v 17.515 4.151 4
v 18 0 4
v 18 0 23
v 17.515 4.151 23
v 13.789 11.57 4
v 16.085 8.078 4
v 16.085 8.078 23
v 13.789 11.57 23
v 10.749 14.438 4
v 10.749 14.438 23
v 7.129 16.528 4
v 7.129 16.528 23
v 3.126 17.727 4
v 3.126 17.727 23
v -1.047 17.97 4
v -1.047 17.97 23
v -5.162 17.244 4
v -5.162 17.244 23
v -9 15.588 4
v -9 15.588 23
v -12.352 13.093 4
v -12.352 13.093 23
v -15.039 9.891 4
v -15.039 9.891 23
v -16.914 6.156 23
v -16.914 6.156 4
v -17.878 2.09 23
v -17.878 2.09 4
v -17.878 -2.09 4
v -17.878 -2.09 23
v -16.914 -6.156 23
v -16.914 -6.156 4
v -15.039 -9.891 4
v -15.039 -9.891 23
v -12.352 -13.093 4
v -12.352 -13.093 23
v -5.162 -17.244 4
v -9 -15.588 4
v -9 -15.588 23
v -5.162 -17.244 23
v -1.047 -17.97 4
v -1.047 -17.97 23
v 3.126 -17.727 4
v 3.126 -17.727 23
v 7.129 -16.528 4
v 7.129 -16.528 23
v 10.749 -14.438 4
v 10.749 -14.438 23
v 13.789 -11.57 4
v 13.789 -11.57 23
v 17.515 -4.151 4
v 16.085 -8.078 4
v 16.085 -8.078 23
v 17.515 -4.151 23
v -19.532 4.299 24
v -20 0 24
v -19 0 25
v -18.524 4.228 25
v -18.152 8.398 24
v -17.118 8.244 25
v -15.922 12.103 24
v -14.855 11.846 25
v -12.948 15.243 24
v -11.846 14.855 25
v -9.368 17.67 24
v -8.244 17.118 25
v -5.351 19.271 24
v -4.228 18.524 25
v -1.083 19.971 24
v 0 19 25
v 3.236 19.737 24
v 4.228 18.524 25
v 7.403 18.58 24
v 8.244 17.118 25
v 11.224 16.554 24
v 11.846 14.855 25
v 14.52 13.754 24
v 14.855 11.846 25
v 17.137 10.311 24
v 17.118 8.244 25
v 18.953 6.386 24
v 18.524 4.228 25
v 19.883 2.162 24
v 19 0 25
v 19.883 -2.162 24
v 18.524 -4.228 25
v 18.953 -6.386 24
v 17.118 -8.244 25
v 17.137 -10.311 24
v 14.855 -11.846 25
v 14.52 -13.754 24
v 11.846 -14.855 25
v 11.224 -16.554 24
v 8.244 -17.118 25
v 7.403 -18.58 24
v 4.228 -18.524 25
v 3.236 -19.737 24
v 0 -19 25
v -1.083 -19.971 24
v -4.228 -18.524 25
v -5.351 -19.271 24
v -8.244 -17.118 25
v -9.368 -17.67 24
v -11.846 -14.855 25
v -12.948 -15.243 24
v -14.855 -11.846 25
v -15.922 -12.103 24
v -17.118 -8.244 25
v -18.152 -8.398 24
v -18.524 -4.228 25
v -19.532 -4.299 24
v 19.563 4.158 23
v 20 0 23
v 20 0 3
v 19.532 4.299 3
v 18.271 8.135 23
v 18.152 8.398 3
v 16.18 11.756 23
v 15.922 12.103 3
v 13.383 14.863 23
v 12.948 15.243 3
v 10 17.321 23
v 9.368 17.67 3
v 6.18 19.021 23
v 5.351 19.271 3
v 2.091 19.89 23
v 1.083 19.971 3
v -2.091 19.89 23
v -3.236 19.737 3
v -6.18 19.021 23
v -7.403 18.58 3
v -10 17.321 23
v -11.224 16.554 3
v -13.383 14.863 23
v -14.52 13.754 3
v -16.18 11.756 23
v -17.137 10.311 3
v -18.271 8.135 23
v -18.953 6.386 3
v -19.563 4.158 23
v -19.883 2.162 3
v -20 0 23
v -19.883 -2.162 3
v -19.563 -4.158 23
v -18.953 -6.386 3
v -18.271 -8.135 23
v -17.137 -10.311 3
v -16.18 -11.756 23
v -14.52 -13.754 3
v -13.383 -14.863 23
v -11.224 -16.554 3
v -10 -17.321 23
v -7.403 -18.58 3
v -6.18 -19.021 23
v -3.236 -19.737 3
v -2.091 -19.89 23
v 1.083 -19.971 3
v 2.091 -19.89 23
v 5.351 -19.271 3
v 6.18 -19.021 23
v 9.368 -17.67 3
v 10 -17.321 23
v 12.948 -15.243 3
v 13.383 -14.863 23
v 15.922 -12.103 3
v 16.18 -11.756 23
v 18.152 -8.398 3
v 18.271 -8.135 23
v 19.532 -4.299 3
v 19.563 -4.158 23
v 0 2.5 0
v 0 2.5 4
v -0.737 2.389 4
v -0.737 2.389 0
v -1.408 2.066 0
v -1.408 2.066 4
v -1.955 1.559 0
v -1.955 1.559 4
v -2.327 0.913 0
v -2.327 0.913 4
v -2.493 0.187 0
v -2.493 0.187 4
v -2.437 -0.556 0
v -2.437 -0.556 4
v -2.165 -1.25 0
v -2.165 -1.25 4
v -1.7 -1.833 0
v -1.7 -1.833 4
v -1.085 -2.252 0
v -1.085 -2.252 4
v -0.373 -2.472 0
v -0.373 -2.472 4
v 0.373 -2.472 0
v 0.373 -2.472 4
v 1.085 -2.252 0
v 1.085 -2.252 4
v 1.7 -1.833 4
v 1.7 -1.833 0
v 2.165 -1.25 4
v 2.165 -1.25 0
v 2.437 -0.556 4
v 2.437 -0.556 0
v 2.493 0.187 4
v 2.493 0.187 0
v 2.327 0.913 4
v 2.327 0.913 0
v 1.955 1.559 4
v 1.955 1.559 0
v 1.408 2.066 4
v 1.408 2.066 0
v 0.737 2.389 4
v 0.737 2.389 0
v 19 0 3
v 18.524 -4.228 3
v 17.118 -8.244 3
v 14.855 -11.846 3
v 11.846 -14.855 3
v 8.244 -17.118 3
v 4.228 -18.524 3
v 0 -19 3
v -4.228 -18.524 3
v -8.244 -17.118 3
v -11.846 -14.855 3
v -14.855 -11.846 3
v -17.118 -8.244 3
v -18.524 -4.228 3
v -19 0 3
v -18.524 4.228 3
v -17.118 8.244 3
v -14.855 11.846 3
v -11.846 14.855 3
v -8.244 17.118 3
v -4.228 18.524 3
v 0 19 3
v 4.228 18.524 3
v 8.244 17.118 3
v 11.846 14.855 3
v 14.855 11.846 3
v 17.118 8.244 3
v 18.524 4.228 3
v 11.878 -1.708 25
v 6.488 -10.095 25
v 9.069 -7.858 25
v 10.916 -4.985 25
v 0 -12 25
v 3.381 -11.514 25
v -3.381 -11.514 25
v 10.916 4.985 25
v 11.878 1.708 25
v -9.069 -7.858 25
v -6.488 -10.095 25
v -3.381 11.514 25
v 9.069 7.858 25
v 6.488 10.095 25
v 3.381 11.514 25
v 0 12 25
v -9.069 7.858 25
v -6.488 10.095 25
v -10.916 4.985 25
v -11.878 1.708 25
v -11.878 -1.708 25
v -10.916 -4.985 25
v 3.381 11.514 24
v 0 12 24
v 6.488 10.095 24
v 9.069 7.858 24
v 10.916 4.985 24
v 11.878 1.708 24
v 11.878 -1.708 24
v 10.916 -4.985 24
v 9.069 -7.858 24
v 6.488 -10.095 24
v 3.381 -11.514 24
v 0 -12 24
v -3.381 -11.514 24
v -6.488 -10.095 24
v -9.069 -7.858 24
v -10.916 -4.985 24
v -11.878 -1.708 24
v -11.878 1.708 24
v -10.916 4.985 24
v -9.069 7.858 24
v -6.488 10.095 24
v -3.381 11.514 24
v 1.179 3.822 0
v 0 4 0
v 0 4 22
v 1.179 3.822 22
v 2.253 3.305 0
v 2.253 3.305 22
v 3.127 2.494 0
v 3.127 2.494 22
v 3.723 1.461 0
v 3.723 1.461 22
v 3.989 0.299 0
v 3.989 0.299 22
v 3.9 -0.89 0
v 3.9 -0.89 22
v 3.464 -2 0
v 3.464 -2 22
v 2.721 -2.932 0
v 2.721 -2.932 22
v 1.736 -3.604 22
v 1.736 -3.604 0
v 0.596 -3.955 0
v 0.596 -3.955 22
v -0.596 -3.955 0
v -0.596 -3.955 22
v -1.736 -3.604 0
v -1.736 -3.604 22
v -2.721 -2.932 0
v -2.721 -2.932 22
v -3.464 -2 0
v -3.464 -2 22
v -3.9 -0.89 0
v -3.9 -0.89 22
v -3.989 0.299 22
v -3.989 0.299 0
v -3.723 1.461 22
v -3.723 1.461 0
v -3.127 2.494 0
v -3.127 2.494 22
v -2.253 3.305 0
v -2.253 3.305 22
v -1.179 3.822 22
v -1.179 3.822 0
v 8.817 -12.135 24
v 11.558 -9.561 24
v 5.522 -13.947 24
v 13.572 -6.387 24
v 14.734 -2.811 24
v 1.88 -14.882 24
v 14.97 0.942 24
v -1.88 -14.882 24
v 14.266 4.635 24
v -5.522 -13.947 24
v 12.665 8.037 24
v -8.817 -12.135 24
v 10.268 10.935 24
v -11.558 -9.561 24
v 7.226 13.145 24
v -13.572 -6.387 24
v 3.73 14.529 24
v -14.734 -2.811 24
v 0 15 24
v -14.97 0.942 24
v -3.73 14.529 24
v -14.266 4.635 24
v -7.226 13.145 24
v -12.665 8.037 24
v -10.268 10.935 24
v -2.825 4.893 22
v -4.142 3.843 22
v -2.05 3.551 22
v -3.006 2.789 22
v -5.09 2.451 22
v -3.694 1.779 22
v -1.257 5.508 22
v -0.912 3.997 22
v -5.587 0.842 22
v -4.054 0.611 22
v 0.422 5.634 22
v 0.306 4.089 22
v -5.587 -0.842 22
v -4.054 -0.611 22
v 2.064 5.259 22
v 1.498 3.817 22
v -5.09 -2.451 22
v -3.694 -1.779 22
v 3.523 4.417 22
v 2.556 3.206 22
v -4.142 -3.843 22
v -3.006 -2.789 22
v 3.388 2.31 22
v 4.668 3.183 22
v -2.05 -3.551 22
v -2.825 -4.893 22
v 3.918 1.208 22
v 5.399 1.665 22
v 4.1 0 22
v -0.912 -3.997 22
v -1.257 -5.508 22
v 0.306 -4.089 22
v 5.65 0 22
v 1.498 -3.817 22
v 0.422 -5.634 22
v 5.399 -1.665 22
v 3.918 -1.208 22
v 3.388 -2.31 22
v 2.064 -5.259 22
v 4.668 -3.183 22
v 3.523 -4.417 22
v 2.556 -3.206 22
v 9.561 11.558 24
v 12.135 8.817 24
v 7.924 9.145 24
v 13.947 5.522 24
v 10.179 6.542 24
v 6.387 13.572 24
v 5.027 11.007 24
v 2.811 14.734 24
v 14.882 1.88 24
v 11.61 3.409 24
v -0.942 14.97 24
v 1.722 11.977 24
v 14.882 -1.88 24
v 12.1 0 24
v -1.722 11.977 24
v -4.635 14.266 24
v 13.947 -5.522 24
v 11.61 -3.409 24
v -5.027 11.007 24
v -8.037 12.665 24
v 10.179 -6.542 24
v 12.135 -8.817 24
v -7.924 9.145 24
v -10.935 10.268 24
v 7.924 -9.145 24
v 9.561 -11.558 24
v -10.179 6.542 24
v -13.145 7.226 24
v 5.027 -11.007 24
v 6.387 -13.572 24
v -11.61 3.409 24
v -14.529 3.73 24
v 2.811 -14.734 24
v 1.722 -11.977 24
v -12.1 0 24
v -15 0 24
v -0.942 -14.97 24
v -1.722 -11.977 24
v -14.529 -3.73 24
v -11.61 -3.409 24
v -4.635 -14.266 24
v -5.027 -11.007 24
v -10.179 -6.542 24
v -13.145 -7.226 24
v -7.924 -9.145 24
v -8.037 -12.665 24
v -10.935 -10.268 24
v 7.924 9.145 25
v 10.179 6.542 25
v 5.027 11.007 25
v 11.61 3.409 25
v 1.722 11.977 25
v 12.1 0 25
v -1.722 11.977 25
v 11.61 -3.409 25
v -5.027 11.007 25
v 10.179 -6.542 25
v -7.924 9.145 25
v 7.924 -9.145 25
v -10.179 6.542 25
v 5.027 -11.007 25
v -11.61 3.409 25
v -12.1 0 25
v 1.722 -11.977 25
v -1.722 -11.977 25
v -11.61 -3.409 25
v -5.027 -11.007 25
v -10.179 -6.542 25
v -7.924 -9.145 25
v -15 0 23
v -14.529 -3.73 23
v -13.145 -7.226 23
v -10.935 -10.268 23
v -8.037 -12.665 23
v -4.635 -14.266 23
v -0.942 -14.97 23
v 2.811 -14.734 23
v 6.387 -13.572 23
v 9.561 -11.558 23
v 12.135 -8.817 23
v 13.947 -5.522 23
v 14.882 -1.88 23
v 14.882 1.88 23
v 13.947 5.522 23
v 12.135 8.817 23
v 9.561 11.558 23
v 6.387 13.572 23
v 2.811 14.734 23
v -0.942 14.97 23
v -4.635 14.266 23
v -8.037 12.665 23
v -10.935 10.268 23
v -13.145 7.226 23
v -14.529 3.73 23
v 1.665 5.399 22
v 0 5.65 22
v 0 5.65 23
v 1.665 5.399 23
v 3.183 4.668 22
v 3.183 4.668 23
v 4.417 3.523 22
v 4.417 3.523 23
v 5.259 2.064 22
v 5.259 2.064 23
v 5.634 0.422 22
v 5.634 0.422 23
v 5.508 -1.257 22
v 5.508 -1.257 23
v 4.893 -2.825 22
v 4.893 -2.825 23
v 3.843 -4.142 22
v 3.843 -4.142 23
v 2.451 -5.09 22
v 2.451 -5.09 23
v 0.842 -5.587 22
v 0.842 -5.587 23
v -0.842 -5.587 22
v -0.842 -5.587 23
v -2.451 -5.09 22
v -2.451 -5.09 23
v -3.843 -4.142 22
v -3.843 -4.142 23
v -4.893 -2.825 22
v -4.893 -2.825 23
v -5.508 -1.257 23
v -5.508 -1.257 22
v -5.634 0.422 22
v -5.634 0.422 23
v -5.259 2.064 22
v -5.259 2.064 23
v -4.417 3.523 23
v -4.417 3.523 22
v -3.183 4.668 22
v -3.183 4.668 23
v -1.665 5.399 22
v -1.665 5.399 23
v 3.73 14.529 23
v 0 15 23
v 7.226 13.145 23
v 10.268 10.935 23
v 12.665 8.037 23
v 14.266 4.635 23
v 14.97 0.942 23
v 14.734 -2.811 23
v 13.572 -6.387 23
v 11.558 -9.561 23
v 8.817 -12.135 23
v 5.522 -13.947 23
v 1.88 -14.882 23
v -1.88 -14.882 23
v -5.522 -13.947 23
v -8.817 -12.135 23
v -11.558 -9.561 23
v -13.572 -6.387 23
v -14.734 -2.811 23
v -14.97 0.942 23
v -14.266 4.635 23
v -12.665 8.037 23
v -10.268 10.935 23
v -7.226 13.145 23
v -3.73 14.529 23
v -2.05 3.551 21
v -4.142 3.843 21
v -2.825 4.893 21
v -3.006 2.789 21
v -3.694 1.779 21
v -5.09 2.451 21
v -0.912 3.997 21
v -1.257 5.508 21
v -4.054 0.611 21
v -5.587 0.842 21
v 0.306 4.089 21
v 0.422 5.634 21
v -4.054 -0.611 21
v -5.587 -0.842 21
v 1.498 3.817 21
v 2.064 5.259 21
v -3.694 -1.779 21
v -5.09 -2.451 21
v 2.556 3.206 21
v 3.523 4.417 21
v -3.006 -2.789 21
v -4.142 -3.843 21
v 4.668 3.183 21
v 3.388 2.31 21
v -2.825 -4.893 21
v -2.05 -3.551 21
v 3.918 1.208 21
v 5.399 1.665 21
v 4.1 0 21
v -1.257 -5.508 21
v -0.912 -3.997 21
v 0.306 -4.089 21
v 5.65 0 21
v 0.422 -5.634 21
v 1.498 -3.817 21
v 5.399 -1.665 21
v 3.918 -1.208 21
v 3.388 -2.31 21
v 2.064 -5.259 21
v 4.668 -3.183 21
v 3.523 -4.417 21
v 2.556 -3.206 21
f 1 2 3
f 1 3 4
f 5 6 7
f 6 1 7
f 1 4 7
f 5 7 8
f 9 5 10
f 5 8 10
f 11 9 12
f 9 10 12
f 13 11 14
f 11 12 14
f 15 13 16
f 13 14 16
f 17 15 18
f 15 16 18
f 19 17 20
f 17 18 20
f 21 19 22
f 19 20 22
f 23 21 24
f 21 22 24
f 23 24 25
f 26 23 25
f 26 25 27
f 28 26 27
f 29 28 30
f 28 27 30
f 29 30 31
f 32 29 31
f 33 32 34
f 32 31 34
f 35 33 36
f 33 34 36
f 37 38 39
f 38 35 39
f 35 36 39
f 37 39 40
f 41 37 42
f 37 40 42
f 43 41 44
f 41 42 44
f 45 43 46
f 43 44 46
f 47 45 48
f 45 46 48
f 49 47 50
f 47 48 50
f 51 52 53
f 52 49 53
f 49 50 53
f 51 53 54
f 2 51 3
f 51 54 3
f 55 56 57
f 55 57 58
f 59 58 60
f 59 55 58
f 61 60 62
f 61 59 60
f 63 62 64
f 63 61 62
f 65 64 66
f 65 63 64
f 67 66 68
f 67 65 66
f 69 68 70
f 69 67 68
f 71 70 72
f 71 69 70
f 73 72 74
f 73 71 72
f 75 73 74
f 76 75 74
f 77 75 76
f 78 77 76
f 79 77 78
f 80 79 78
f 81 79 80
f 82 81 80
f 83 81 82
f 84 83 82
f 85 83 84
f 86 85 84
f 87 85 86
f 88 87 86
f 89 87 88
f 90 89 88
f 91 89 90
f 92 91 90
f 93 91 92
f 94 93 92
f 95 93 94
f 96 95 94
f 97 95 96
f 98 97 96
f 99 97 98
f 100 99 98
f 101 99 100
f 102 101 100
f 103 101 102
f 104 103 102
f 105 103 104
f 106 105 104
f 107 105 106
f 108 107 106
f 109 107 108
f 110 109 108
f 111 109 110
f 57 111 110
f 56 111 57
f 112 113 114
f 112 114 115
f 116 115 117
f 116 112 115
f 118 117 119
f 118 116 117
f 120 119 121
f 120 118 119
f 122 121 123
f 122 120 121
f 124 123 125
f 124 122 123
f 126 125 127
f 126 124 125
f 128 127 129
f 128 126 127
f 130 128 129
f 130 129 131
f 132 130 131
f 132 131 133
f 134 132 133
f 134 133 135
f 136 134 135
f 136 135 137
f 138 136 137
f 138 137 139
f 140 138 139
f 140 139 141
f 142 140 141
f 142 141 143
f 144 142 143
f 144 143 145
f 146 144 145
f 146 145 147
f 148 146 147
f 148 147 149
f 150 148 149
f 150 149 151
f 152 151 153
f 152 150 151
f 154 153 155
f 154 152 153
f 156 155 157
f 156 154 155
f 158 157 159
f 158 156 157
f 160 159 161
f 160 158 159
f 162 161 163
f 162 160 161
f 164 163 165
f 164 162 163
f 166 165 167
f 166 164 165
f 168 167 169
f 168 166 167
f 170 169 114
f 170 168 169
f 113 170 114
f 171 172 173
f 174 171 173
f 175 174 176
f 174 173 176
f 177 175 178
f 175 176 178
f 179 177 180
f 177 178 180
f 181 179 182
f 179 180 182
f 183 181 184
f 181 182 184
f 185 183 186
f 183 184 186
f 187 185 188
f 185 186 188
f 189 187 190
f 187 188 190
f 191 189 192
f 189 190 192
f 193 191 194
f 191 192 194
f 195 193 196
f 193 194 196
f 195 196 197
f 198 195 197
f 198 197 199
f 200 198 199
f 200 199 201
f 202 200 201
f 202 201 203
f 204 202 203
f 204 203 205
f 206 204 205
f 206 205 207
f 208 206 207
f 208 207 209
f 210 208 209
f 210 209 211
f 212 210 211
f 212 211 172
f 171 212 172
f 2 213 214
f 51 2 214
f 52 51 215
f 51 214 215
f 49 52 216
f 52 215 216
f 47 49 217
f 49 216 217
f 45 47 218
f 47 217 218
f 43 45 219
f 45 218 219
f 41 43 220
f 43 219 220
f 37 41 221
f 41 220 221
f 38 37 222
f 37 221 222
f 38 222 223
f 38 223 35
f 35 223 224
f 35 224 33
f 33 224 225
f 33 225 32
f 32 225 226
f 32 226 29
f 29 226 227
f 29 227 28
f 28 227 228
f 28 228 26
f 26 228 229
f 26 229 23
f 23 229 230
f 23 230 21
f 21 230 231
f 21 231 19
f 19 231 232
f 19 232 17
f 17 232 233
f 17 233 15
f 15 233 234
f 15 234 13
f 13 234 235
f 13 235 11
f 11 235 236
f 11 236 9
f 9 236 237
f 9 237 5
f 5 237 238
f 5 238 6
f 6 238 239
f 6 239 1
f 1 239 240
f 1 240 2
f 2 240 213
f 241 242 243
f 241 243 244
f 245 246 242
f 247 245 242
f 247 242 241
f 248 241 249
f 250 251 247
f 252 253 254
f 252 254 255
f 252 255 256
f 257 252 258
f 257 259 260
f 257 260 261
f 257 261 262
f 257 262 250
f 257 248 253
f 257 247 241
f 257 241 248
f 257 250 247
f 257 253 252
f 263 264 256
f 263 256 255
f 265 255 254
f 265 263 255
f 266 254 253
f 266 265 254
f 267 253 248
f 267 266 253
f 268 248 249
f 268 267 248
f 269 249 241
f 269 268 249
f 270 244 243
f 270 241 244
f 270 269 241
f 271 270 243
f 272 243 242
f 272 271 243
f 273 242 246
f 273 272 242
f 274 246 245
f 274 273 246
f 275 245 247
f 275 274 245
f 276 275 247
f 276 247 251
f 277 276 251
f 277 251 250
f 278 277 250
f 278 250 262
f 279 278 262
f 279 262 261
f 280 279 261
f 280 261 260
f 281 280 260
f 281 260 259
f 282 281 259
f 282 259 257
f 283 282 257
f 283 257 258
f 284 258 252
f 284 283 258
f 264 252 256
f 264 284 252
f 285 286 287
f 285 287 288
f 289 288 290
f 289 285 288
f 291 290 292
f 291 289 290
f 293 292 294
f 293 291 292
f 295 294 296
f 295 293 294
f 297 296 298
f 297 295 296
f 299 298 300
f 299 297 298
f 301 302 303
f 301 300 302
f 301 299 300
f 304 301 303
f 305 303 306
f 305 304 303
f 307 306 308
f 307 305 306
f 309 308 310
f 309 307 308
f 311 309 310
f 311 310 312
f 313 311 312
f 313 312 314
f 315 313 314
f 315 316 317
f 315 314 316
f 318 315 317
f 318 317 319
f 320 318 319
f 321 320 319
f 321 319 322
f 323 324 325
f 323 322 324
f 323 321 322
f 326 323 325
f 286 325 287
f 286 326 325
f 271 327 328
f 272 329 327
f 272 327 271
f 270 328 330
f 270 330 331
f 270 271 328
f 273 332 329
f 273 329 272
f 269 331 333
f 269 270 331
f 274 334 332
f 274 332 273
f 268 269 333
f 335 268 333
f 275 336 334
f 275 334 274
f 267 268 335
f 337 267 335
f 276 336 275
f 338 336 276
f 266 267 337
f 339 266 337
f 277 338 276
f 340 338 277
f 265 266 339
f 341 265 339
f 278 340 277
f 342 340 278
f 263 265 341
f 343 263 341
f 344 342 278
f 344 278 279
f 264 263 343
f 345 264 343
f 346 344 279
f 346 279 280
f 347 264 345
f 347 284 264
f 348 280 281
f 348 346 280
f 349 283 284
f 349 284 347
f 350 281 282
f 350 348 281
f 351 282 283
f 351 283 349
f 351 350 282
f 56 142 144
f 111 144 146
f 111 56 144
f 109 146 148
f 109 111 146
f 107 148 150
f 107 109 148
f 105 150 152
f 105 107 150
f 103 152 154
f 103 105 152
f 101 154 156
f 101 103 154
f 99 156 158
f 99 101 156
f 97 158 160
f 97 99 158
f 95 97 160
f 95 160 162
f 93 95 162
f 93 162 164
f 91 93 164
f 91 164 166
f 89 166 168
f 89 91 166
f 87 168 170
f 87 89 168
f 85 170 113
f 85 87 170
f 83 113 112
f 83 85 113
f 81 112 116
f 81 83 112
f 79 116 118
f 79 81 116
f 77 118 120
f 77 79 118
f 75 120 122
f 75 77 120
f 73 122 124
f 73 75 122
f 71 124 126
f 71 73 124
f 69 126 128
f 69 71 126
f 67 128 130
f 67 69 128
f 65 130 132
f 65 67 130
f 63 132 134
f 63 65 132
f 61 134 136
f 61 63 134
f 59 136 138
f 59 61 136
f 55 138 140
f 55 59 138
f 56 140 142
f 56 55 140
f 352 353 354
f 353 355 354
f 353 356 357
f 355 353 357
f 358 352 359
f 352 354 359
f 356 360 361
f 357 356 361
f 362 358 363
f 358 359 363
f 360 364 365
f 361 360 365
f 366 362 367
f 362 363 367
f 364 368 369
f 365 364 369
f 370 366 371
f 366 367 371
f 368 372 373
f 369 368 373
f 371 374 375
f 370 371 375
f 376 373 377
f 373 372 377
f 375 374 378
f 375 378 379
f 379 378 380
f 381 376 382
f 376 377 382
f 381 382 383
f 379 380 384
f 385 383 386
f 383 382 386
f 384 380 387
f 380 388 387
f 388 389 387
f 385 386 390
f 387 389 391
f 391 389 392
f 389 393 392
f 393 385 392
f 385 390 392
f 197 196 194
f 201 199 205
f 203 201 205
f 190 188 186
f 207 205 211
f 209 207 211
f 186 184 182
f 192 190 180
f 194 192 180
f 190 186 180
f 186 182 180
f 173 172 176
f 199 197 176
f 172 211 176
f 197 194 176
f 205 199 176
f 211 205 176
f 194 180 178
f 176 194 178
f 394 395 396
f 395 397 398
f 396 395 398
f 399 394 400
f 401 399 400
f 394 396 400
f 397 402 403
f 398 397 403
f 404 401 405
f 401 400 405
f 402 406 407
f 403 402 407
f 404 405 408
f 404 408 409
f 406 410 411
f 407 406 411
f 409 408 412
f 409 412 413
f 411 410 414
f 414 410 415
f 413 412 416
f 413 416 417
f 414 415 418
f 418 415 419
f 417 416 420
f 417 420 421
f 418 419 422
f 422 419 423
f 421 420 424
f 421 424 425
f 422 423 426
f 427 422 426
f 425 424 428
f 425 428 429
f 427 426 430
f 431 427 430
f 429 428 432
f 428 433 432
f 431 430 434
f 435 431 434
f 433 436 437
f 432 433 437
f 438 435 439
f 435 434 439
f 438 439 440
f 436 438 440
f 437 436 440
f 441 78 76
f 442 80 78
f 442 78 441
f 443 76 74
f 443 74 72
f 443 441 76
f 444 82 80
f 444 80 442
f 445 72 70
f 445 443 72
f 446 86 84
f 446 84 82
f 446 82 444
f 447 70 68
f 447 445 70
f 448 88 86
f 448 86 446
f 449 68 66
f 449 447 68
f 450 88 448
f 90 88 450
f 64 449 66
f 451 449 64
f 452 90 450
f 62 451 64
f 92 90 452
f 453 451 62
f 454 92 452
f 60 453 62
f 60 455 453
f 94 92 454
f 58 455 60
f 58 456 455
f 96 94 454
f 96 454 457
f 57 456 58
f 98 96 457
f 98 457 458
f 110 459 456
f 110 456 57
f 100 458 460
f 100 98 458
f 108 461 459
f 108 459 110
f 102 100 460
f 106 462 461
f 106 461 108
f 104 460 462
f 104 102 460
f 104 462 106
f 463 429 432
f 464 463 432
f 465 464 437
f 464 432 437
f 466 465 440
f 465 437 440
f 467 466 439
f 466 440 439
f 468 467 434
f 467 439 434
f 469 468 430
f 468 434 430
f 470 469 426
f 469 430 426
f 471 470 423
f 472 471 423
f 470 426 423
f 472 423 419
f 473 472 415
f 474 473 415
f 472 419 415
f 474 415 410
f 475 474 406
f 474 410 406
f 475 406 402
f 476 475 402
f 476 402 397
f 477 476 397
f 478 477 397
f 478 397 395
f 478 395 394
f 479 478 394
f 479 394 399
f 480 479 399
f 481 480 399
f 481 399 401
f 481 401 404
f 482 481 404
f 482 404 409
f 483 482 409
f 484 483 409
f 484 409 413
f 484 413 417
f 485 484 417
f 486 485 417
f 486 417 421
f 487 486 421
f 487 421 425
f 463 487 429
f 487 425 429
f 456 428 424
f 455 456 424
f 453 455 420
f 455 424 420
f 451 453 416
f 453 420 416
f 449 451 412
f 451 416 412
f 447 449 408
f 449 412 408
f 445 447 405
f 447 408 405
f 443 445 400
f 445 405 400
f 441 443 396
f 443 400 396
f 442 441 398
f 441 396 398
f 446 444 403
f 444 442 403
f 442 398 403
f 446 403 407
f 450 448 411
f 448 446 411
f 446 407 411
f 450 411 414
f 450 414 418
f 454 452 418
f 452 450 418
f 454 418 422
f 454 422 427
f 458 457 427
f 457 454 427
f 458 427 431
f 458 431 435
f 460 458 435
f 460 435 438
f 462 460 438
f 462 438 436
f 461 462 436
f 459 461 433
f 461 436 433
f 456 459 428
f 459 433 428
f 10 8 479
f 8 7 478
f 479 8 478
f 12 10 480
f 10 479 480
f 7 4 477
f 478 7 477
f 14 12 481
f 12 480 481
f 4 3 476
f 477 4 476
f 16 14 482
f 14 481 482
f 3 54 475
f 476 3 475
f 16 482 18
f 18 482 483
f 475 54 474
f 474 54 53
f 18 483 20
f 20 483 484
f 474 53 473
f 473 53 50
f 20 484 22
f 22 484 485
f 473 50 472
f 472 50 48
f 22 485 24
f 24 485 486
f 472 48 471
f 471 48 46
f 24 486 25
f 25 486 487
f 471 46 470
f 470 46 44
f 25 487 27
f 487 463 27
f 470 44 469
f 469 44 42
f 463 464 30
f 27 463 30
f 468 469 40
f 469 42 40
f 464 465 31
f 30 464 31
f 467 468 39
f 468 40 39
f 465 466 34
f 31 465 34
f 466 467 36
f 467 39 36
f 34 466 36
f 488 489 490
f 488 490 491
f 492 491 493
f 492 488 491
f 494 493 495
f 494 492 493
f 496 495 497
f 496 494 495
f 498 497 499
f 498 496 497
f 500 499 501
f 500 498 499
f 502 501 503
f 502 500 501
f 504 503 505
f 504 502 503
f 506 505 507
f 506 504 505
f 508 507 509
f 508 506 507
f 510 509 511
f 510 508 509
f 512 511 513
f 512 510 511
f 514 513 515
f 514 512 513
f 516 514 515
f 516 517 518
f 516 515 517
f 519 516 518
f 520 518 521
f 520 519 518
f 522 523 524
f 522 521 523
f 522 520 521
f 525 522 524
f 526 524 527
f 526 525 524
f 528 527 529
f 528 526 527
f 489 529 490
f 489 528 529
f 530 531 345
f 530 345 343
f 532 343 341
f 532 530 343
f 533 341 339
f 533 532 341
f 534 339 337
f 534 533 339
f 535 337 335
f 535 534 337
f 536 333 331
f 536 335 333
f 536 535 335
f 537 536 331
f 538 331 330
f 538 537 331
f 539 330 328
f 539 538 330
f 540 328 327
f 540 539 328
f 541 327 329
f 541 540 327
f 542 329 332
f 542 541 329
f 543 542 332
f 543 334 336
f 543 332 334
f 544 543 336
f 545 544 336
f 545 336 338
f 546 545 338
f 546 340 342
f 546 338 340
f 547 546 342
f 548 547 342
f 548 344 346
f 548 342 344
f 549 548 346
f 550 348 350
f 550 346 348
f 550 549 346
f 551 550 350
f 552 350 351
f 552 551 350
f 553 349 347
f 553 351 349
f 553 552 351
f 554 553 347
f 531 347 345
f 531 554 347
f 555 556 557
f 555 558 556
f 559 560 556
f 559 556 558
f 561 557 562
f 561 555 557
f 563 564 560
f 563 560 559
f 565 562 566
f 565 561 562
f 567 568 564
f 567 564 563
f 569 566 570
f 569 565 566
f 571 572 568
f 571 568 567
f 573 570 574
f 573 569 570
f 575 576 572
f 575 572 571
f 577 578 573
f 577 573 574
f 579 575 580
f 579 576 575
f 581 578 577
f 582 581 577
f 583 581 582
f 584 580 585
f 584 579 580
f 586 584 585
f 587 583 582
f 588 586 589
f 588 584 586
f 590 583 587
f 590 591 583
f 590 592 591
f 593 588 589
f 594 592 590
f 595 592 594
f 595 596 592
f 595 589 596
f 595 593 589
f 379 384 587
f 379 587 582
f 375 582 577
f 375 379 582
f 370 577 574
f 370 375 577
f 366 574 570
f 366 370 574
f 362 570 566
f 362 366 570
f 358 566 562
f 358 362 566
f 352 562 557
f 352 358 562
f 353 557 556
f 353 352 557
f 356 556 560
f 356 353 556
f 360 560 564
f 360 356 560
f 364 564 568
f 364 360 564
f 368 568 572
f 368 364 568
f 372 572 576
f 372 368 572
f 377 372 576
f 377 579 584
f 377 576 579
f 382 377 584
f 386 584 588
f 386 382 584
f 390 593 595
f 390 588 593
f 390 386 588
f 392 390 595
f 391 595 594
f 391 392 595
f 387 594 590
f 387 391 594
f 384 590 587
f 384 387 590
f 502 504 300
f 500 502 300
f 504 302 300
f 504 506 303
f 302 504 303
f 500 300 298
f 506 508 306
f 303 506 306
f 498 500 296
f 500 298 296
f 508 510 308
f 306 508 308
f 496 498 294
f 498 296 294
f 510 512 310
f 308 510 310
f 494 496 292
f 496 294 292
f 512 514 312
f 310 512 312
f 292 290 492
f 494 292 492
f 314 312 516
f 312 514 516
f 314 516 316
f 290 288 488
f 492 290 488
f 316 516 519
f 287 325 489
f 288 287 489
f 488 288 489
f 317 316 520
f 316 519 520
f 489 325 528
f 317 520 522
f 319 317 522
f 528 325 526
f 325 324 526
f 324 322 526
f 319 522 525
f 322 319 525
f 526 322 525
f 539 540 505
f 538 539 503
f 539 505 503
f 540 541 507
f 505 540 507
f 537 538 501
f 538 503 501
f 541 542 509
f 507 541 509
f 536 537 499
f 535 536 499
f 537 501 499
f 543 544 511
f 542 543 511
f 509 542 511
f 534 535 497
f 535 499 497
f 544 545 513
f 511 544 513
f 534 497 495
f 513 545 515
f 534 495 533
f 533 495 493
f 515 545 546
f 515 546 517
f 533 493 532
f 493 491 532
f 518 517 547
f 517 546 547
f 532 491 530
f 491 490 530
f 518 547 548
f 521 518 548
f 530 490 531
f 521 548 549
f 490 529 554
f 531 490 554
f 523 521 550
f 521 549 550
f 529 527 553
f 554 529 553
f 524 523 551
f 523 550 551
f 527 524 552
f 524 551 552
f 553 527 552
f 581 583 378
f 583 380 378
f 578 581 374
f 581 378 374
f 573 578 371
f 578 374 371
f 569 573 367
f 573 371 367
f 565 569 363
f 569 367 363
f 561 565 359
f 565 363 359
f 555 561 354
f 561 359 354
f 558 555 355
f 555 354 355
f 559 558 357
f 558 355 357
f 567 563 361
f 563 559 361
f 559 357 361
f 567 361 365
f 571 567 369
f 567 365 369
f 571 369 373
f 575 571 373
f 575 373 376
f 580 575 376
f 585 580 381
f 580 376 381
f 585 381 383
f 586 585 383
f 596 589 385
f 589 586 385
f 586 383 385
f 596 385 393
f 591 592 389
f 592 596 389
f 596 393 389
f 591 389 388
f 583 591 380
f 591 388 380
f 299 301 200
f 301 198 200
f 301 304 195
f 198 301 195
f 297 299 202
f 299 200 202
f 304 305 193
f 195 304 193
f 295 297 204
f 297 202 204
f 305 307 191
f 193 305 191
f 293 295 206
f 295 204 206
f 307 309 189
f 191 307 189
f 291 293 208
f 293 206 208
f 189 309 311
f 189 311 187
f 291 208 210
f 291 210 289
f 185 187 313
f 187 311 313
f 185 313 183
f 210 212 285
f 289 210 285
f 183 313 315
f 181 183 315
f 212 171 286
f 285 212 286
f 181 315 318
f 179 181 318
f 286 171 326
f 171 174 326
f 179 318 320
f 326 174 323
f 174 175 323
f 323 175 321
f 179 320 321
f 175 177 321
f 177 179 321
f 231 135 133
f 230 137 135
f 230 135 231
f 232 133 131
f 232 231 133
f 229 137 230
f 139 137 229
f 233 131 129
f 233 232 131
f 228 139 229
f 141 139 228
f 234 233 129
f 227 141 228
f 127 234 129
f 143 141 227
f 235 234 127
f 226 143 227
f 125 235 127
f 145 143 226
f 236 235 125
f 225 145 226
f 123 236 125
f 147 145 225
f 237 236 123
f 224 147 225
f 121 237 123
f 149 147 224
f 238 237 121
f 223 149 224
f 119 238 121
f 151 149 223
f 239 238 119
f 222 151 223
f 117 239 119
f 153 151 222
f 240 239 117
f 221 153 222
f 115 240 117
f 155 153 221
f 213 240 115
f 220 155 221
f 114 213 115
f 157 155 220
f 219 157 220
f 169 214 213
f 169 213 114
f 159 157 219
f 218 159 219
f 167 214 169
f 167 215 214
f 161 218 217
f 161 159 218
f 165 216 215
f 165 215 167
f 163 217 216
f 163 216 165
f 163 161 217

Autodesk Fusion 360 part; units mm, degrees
sketch "Skizze1" plane through (0, 0, 0) normal (0, 0, 1) x (1, 0, 0)
sketch "Skizze2" plane through (0, 0, 0) normal (1, 0, 0) x (0, 1, 0)
  line L0 (0, 4) -> (0, 25)
  line L1 (0, 25) -> (12, 25)
  line L2 (12, 25) -> (12, 24)
  line L3 (12, 24) -> (15, 24)
  line L4 (15, 24) -> (15, 23)
  line L5 (15, 23) -> (5.65, 23)
  line L6 (5.65, 23) -> (5.65, 22)
  line L7 (5.65, 22) -> (4, 22)
  line L8 (4, 22) -> (4, 0)
  line L9 (4, 0) -> (2.5, 0)
  line L10 (2.5, 0) -> (2.5, 4)
  line L11 (2.5, 4) -> (0, 4)
  dimension "d2" = 4
  dimension "d4" = 2.5
  dimension "d5" = 4
  dimension "d6" = 15
  dimension "d7" = 3
  dimension "d8" = 1
  dimension "d9" = 1.65
  dimension "d10" = 4
  dimension "d11" = 22
  dimension "d13" = 1
  dimension "d14" = 1
revolve "Drehen1" add sketch "Skizze2" angle 360 about axis through (0, 0, 1.75) along (0, 0, 1) makes body 1
sketch "Skizze3" plane through (0, 0, 24) normal (0, 0, 1) x (-1, 0, 0)
  circle A0 centre (0, 0) radius 12
  circle A1 centre (0, 0) radius 15
  circle A2 centre (0, 0) radius 12
  circle A3 centre (0, 0) radius 20
  circle A4 centre (0, 0) radius 12.1
  dimension "d15" = 40
  dimension "d16" = 0.1
extrude "Extrusion2" add sketch "Skizze3" along normal blind 1 separate body contours A1 | A3 makes body 2
sketch "Skizze4" plane through (0, 0, 24) normal (0, 0, 1) x (-1, 0, 0)
  circle A0 centre (0, 0) radius 15
  circle A1 centre (0, 0) radius 5.65
  circle A2 centre (0, 0) radius 15.1
  dimension "d21" = 0.1
extrude "Extrusion3" add sketch "Skizze3" against normal blind 1 contours A3 bodies 2
sketch "Skizze5" plane through (0, 0, 23) normal (0, 0, -1) x (1, 0, 0)
  circle A0 centre (0, 0) radius 15
  circle A1 centre (0, 0) radius 20
  circle A2 centre (0, 0) radius 18
  dimension "d24" = -2
extrude "Extrusion4" add sketch "Skizze5" along normal blind 20 contours A1 bodies 2
chamfer "Fase1" distance 1 angle 45 1 edges at (18.6465, 7.2323, 25) on bodies 2
chamfer "Fase2" distance 1 angle 45 1 edges at (-16.7819, -6.5091, 3) on bodies 2
sketch "Skizze6" plane through (0, 0, 22) normal (0, 0, -1) x (1, 0, 0)
  circle A0 centre (0, 0) radius 5.65
  circle A1 centre (0, 0) radius 4
  circle A2 centre (0, 0) radius 4.1
  dimension "d29" = 0.1
extrude "Extrusion5" add sketch "Skizze6" along normal blind 1 separate body contours A0 makes body 3
equation "d5 = d2"
